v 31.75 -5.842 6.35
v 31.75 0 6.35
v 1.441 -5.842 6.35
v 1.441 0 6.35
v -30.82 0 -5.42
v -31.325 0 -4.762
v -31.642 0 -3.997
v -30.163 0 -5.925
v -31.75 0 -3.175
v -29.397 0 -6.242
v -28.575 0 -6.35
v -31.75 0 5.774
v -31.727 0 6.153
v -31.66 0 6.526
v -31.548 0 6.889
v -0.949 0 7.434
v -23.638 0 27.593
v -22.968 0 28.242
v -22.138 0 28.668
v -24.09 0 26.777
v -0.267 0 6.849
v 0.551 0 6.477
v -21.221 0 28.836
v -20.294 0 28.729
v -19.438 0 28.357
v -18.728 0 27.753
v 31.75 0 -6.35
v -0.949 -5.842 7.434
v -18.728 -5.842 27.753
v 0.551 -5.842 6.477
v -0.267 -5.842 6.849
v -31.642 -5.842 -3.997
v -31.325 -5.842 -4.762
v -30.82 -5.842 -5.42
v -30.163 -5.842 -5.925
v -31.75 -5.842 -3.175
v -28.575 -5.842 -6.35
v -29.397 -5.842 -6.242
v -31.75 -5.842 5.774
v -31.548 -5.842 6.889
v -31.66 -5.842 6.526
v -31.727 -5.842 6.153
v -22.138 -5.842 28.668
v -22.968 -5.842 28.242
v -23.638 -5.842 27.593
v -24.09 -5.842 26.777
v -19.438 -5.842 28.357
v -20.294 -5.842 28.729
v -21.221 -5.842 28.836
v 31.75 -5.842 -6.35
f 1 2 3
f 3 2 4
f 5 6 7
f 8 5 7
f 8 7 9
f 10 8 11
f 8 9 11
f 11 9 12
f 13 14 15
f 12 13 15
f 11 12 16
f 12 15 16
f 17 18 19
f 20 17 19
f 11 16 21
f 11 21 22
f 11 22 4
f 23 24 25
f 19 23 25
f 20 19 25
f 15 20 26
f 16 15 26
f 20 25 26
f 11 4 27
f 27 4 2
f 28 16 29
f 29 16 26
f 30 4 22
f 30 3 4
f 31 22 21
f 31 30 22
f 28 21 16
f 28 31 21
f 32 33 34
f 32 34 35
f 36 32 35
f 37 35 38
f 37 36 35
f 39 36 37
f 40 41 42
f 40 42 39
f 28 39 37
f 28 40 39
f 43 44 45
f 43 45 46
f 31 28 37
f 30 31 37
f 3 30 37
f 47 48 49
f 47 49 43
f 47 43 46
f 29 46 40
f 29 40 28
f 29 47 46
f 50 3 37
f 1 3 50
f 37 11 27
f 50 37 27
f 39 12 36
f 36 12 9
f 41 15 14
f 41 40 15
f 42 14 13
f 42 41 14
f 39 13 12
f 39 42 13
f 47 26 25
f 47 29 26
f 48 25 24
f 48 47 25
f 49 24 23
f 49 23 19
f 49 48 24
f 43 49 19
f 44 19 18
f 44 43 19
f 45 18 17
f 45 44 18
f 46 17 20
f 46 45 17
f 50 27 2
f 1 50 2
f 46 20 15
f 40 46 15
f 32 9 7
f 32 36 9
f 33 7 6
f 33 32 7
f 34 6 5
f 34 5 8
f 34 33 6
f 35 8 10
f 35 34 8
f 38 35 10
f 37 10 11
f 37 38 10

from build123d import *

# Parameters (mm, degrees)
F1_DEPTH = 5.842
F2_R     = 3.175
F3_R     = 3.175


with BuildPart() as f1:
    # F0 (on Front) → F1 (new body)
    with BuildSketch(Plane.XZ):
        Polygon((31.75, 6.35), (0, 6.35), (-22.225, 31.75), (-31.75, 6.35), (-31.75, -6.35), (31.75, -6.35), align=None)
    extrude(amount=F1_DEPTH)

    # F2
    f2_edges = [f1.edges().sort_by_distance(p)[0] for p in [
        (0, -2.921, 6.35),
        (-31.75, -2.921, 6.35),
        (-31.75, -2.921, -6.35),
    ]]
    fillet(f2_edges, radius=F2_R)

    # F3
    f3_edges = [f1.edges().sort_by_distance(p)[0] for p in [
        (-22.225, -2.921, 31.75),
    ]]
    fillet(f3_edges, radius=F3_R)


solid = f1.part
